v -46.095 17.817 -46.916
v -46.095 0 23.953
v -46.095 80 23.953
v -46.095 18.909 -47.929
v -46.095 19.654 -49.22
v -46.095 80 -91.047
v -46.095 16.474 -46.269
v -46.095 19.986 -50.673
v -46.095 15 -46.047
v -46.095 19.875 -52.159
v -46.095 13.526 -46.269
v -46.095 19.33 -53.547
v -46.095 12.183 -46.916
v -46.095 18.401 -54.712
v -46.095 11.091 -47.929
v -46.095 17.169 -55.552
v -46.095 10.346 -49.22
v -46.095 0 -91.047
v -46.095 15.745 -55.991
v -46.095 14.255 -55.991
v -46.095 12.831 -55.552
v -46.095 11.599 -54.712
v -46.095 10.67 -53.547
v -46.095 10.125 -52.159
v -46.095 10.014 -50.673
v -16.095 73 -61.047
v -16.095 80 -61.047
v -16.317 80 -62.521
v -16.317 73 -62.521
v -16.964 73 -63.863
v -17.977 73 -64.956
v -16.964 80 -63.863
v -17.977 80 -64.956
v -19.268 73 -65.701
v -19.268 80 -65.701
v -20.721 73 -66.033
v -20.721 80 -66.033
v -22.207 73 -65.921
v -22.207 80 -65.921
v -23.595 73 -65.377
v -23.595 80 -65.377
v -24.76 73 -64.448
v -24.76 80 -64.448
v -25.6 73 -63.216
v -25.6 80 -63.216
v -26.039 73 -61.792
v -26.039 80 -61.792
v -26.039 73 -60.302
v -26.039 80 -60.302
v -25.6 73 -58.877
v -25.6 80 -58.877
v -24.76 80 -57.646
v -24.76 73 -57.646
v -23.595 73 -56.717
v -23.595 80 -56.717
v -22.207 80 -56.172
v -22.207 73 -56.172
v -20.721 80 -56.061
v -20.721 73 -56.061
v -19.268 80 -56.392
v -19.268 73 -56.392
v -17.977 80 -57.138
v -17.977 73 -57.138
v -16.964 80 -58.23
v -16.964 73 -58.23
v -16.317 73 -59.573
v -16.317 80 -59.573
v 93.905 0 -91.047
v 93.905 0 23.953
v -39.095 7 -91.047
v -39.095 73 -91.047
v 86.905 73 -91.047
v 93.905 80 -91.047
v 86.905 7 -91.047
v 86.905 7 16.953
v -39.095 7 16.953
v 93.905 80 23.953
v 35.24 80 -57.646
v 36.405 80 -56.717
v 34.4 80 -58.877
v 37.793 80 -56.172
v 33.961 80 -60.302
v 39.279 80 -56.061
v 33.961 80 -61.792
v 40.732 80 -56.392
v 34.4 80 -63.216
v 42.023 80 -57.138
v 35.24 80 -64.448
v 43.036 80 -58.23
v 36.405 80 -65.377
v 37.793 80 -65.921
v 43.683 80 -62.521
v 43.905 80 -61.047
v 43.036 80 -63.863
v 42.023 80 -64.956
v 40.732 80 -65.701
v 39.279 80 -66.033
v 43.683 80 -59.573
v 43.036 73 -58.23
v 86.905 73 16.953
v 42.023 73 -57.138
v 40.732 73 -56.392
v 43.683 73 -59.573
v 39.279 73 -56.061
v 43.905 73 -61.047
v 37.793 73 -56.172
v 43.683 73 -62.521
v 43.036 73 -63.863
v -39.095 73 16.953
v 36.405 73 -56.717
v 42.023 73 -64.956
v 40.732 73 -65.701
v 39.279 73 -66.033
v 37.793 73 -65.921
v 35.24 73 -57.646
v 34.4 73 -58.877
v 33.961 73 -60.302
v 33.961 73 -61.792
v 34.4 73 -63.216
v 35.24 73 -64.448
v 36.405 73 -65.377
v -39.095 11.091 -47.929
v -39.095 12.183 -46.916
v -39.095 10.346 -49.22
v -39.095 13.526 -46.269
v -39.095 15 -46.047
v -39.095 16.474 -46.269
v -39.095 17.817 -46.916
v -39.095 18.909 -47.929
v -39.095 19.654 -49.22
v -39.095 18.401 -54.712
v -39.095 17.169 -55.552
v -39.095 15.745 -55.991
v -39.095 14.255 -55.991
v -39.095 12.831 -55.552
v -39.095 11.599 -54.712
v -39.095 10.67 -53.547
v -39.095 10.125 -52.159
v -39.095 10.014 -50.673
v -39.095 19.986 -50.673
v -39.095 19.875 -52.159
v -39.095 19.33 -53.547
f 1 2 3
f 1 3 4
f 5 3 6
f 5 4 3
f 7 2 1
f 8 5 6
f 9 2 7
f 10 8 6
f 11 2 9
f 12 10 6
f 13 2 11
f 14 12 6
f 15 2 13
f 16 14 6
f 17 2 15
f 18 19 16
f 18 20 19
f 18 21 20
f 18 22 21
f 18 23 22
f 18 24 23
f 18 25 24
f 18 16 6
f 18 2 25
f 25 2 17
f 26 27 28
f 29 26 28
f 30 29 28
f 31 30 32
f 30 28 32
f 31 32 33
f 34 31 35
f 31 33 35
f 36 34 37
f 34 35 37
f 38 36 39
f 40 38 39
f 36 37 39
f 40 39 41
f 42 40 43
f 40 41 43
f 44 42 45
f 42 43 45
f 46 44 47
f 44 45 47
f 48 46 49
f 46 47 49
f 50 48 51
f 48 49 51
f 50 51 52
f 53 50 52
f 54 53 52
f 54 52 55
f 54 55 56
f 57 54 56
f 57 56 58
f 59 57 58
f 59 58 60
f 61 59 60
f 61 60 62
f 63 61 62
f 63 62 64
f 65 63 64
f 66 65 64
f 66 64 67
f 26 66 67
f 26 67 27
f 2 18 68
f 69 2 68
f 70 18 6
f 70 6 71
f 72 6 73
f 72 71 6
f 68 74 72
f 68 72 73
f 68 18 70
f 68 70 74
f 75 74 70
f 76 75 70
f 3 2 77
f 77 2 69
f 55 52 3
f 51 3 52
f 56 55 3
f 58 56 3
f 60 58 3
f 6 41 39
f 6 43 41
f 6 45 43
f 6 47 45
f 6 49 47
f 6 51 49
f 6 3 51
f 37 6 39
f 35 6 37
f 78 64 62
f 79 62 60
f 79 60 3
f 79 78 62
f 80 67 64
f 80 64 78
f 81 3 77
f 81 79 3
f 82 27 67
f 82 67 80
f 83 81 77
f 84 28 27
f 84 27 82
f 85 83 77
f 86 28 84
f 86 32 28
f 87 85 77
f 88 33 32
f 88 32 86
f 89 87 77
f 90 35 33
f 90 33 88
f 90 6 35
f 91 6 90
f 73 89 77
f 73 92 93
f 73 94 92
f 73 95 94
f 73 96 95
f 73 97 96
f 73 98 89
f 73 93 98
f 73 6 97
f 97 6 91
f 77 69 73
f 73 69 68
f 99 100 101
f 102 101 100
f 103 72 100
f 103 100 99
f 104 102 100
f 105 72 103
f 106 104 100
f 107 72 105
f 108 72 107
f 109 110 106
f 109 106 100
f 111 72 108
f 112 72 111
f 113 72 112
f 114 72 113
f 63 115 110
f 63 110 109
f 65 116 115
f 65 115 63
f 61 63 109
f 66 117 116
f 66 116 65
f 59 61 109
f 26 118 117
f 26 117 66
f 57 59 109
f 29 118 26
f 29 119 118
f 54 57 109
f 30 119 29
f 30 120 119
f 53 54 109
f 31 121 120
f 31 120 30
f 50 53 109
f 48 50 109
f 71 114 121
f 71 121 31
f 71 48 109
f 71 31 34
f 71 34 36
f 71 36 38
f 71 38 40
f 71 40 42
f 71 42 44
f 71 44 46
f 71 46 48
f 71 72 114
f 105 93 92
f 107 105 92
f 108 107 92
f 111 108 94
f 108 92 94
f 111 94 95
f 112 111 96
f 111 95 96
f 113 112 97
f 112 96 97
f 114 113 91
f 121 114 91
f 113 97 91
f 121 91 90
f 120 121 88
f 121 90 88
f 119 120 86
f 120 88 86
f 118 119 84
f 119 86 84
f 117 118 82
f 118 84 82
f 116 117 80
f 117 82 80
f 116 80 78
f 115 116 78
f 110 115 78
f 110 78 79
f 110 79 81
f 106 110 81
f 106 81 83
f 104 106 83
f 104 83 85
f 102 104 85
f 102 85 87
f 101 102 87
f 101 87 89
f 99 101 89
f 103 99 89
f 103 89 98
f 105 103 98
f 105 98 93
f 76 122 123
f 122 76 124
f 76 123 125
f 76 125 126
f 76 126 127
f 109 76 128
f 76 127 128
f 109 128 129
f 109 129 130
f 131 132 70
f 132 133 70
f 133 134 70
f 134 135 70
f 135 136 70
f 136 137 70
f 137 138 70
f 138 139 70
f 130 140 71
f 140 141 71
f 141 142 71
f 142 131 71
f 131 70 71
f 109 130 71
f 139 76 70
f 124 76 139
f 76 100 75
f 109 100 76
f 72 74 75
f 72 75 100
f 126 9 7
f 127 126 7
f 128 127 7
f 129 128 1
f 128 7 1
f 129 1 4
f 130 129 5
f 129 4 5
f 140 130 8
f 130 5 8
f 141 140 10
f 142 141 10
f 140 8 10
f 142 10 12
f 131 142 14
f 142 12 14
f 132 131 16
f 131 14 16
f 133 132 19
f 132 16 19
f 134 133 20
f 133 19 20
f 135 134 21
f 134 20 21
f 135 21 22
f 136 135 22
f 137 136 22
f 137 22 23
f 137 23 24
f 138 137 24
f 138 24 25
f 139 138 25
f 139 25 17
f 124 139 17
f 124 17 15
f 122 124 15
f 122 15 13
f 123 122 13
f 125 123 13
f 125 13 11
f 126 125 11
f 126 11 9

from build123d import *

# Parameters (mm, degrees)
SKETCH1_W                        = 140
SKETCH1_H                        = 115
BOSS_EXTRUDE1_DEPTH              = 80
SKETCH3_W                        = 126
SKETCH3_H                        = 66
CUT_EXTRUDE1_DEPTH               = 108
M10X1_0_TAPPED_HOLE1_D           = 9
M10X1_0_TAPPED_HOLE1_DEPTH       = 23
M10X1_0_TAPPED_HOLE1_CBORE_D     = 10
M10X1_0_TAPPED_HOLE1_CBORE_DEPTH = 20
M10X1_0_TAPPED_HOLE1_TIP         = 2.703872786
M10X1_0_TAPPED_HOLE2_D           = 9
M10X1_0_TAPPED_HOLE2_DEPTH       = 23
M10X1_0_TAPPED_HOLE2_CBORE_D     = 10
M10X1_0_TAPPED_HOLE2_CBORE_DEPTH = 20
M10X1_0_TAPPED_HOLE2_TIP         = 2.703872786


with BuildPart() as part:
    # Sketch1 → Boss-Extrude1 (new body)
    with BuildSketch(Plane(origin=(0, 0, 0), x_dir=(1, 0, 0), z_dir=(0, 1, 0))):
        with Locations((23.905213361, 33.54681393)):
            Rectangle(SKETCH1_W, SKETCH1_H)
    extrude(amount=BOSS_EXTRUDE1_DEPTH)

    # Sketch3 → Cut-Extrude1 (cut)
    with BuildSketch(Plane(origin=(0, 0, -91.04681393), x_dir=(-1, 0, 0), z_dir=(0, 0, -1))):
        with Locations((-23.905213361, 40)):
            Rectangle(SKETCH3_W, SKETCH3_H)
    extrude(amount=-CUT_EXTRUDE1_DEPTH, mode=Mode.SUBTRACT)

    # M10x1.0 Tapped Hole1
    with Locations(Plane(origin=(0, 80, 0), x_dir=(1, 0, 0), z_dir=(0, 1, 0))):
        with Locations((-21.094786639, 61.04681393), (38.905213361, 61.04681393)):
            CounterBoreHole(M10X1_0_TAPPED_HOLE1_D / 2, M10X1_0_TAPPED_HOLE1_CBORE_D / 2, M10X1_0_TAPPED_HOLE1_CBORE_DEPTH, depth=M10X1_0_TAPPED_HOLE1_DEPTH)
            with Locations((0, 0, -(M10X1_0_TAPPED_HOLE1_DEPTH + M10X1_0_TAPPED_HOLE1_TIP / 2))):  # 118° drill point
                Cone(0, M10X1_0_TAPPED_HOLE1_D / 2, M10X1_0_TAPPED_HOLE1_TIP, mode=Mode.SUBTRACT)

    # M10x1.0 Tapped Hole2
    with Locations(Plane.ZY.offset(46.094786639)):
        with Locations((-51.04681393, 15)):
            CounterBoreHole(M10X1_0_TAPPED_HOLE2_D / 2, M10X1_0_TAPPED_HOLE2_CBORE_D / 2, M10X1_0_TAPPED_HOLE2_CBORE_DEPTH, depth=M10X1_0_TAPPED_HOLE2_DEPTH)
            with Locations((0, 0, -(M10X1_0_TAPPED_HOLE2_DEPTH + M10X1_0_TAPPED_HOLE2_TIP / 2))):  # 118° drill point
                Cone(0, M10X1_0_TAPPED_HOLE2_D / 2, M10X1_0_TAPPED_HOLE2_TIP, mode=Mode.SUBTRACT)


solid = part.part
